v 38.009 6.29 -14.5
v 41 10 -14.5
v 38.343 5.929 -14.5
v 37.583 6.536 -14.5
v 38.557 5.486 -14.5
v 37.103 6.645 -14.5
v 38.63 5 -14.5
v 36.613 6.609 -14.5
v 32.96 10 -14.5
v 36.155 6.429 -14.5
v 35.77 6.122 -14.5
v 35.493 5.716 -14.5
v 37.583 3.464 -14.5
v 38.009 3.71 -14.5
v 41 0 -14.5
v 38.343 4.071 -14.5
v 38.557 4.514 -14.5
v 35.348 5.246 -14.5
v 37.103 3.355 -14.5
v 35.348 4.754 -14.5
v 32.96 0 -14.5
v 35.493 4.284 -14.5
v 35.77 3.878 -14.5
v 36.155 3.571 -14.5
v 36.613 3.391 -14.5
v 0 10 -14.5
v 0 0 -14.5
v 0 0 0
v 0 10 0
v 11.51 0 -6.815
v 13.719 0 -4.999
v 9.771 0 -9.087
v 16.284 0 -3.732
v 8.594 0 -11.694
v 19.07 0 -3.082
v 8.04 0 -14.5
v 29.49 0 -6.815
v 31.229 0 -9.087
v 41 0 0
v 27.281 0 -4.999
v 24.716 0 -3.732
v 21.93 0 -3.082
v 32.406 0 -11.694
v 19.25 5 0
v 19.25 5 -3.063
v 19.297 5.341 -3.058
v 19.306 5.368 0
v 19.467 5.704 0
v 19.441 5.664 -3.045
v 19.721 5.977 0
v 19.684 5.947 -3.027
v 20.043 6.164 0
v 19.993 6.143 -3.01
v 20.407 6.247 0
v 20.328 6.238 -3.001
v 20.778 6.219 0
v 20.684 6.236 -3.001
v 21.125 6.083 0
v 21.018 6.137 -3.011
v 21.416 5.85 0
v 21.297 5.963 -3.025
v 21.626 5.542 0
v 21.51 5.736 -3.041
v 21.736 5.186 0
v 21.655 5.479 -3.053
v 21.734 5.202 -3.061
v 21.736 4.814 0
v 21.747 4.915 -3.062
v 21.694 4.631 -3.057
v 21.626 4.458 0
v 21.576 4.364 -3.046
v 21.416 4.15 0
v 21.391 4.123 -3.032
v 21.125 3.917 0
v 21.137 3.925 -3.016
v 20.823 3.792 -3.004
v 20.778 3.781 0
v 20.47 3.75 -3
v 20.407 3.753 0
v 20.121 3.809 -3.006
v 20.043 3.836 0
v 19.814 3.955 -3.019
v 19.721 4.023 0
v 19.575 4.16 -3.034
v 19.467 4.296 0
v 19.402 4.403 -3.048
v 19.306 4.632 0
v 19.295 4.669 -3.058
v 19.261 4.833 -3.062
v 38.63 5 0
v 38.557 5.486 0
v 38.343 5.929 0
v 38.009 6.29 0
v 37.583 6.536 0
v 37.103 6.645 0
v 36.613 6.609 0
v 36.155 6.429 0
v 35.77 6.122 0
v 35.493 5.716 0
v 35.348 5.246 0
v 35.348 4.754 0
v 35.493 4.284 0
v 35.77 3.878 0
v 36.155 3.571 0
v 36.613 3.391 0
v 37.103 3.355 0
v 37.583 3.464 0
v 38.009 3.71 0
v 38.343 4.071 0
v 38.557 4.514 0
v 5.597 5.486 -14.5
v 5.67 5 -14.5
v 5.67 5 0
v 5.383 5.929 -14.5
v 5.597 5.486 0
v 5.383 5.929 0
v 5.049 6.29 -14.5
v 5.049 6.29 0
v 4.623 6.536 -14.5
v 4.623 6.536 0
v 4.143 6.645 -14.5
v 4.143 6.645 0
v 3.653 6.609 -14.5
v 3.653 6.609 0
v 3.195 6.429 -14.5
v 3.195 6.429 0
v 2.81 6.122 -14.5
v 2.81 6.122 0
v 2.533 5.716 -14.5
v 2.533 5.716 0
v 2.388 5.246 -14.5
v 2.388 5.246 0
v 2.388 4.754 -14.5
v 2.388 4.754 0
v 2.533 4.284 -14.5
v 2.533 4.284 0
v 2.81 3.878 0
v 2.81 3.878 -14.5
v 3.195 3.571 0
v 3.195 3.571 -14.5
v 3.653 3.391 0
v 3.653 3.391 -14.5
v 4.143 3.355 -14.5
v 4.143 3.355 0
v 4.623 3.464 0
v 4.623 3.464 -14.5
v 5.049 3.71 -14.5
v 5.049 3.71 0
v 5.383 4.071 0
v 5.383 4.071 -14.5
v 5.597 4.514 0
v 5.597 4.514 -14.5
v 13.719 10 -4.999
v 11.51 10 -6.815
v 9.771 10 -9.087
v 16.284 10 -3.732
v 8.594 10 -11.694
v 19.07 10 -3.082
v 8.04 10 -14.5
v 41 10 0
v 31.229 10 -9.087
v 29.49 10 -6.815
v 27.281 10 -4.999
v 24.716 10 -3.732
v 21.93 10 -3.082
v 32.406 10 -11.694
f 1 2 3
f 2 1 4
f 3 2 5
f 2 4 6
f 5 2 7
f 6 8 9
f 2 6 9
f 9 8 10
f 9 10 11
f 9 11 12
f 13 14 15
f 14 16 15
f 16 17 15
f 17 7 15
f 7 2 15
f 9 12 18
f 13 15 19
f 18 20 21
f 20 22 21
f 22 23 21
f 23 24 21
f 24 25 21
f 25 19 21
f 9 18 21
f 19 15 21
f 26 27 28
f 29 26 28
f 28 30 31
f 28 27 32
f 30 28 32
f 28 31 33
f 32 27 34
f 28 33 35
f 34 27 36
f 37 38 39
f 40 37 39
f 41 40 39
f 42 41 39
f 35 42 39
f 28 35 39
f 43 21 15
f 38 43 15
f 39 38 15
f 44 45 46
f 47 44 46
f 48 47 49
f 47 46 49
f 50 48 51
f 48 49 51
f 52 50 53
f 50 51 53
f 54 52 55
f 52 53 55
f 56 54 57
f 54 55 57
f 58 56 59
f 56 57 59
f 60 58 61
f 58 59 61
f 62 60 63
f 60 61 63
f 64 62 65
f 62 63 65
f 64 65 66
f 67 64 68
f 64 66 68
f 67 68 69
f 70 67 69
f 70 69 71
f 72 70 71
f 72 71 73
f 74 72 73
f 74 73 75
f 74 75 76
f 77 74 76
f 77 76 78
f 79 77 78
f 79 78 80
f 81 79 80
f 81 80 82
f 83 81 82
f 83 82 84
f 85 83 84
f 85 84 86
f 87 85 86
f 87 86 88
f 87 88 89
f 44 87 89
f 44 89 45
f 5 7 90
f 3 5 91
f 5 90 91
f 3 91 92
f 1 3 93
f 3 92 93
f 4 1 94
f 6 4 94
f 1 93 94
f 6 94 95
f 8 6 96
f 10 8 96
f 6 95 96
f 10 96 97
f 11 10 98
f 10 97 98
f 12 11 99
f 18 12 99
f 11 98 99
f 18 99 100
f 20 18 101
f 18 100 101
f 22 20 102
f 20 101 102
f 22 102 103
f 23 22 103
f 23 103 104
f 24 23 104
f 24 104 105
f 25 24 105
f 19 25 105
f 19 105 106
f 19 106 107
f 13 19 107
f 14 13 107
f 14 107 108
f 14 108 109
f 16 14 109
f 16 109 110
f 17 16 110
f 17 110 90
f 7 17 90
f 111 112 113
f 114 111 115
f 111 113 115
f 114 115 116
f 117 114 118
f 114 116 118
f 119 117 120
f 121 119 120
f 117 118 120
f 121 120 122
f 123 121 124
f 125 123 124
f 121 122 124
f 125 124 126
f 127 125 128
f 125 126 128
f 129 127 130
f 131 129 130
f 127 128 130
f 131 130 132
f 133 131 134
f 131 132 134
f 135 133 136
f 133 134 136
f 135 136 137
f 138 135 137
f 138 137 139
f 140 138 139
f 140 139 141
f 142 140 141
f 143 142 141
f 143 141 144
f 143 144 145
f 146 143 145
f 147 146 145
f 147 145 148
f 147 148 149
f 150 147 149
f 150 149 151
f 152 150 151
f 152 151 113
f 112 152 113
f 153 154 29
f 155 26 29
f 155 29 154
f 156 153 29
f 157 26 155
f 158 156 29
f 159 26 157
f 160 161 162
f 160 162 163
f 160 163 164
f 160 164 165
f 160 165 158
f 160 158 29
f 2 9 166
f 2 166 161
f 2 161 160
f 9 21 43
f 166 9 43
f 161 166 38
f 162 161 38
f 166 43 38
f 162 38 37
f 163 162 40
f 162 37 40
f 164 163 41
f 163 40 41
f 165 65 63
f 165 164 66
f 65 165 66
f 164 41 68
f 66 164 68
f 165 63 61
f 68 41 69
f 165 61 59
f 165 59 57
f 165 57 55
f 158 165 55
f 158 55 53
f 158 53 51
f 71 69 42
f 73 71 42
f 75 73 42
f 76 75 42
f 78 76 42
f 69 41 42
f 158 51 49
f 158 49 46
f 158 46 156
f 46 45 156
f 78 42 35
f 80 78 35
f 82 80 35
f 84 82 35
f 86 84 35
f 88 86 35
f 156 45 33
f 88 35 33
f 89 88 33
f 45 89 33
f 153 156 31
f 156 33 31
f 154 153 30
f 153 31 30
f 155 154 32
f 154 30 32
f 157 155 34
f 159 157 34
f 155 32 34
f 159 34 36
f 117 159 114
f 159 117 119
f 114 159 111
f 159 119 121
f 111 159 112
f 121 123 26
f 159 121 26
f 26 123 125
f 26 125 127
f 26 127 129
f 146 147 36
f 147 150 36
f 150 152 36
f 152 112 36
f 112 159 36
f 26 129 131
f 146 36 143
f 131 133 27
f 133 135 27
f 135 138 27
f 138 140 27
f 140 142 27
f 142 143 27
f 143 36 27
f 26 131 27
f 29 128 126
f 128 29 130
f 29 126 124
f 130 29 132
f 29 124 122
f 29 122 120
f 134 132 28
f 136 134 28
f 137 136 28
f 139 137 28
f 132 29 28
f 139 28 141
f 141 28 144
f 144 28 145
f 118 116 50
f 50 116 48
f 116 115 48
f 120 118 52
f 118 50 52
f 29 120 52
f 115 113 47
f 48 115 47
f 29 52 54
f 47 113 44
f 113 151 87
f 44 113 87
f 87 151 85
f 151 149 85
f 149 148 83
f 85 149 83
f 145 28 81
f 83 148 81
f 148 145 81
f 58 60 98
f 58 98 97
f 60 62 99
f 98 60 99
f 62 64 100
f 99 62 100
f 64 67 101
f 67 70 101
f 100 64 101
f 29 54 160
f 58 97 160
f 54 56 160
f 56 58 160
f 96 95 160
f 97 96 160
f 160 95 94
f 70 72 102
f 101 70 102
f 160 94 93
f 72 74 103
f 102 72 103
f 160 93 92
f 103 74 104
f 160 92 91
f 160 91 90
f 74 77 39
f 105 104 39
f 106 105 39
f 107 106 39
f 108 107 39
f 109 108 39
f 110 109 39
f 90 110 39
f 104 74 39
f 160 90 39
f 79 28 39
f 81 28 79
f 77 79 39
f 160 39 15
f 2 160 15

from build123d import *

# Parameters (mm, degrees)
EXTRUDE_1_DEPTH = 10
M4X0_71_D       = 3.3
M3X0_51_D       = 2.5


with BuildPart() as part:
    # Эскиз1 → Бобышка-Вытянуть1 (new body)
    with BuildSketch(Plane(origin=(0, 0, 0), x_dir=(1, 0, 0), z_dir=(0, 1, 0))):
        with BuildLine():
            Line((0, 0), (41, 0))
            Line((41, 0), (41, 14.5))
            Line((41, 14.5), (32.959935794, 14.5))
            ThreePointArc((32.959935794, 14.5), (20.5, 3), (8.040064206, 14.5))
            Line((8.040064206, 14.5), (0, 14.5))
            Line((0, 14.5), (0, 0))
        make_face()
    extrude(amount=EXTRUDE_1_DEPTH)

    # Отверстие обработанное метчиком M4x0.71 (through all)
    with Locations(Plane(origin=(0, 0, -14.5), x_dir=(-1, 0, 0), z_dir=(0, 0, -1))):
        with Locations((-36.979967897, 5), (-4.020032103, 5)):
            Hole(M4X0_71_D / 2)

    # Отверстие обработанное метчиком M3x0.51 (through all)
    with Locations(Plane.XY):
        with Locations((20.5, 5)):
            Hole(M3X0_51_D / 2)


solid = part.part
